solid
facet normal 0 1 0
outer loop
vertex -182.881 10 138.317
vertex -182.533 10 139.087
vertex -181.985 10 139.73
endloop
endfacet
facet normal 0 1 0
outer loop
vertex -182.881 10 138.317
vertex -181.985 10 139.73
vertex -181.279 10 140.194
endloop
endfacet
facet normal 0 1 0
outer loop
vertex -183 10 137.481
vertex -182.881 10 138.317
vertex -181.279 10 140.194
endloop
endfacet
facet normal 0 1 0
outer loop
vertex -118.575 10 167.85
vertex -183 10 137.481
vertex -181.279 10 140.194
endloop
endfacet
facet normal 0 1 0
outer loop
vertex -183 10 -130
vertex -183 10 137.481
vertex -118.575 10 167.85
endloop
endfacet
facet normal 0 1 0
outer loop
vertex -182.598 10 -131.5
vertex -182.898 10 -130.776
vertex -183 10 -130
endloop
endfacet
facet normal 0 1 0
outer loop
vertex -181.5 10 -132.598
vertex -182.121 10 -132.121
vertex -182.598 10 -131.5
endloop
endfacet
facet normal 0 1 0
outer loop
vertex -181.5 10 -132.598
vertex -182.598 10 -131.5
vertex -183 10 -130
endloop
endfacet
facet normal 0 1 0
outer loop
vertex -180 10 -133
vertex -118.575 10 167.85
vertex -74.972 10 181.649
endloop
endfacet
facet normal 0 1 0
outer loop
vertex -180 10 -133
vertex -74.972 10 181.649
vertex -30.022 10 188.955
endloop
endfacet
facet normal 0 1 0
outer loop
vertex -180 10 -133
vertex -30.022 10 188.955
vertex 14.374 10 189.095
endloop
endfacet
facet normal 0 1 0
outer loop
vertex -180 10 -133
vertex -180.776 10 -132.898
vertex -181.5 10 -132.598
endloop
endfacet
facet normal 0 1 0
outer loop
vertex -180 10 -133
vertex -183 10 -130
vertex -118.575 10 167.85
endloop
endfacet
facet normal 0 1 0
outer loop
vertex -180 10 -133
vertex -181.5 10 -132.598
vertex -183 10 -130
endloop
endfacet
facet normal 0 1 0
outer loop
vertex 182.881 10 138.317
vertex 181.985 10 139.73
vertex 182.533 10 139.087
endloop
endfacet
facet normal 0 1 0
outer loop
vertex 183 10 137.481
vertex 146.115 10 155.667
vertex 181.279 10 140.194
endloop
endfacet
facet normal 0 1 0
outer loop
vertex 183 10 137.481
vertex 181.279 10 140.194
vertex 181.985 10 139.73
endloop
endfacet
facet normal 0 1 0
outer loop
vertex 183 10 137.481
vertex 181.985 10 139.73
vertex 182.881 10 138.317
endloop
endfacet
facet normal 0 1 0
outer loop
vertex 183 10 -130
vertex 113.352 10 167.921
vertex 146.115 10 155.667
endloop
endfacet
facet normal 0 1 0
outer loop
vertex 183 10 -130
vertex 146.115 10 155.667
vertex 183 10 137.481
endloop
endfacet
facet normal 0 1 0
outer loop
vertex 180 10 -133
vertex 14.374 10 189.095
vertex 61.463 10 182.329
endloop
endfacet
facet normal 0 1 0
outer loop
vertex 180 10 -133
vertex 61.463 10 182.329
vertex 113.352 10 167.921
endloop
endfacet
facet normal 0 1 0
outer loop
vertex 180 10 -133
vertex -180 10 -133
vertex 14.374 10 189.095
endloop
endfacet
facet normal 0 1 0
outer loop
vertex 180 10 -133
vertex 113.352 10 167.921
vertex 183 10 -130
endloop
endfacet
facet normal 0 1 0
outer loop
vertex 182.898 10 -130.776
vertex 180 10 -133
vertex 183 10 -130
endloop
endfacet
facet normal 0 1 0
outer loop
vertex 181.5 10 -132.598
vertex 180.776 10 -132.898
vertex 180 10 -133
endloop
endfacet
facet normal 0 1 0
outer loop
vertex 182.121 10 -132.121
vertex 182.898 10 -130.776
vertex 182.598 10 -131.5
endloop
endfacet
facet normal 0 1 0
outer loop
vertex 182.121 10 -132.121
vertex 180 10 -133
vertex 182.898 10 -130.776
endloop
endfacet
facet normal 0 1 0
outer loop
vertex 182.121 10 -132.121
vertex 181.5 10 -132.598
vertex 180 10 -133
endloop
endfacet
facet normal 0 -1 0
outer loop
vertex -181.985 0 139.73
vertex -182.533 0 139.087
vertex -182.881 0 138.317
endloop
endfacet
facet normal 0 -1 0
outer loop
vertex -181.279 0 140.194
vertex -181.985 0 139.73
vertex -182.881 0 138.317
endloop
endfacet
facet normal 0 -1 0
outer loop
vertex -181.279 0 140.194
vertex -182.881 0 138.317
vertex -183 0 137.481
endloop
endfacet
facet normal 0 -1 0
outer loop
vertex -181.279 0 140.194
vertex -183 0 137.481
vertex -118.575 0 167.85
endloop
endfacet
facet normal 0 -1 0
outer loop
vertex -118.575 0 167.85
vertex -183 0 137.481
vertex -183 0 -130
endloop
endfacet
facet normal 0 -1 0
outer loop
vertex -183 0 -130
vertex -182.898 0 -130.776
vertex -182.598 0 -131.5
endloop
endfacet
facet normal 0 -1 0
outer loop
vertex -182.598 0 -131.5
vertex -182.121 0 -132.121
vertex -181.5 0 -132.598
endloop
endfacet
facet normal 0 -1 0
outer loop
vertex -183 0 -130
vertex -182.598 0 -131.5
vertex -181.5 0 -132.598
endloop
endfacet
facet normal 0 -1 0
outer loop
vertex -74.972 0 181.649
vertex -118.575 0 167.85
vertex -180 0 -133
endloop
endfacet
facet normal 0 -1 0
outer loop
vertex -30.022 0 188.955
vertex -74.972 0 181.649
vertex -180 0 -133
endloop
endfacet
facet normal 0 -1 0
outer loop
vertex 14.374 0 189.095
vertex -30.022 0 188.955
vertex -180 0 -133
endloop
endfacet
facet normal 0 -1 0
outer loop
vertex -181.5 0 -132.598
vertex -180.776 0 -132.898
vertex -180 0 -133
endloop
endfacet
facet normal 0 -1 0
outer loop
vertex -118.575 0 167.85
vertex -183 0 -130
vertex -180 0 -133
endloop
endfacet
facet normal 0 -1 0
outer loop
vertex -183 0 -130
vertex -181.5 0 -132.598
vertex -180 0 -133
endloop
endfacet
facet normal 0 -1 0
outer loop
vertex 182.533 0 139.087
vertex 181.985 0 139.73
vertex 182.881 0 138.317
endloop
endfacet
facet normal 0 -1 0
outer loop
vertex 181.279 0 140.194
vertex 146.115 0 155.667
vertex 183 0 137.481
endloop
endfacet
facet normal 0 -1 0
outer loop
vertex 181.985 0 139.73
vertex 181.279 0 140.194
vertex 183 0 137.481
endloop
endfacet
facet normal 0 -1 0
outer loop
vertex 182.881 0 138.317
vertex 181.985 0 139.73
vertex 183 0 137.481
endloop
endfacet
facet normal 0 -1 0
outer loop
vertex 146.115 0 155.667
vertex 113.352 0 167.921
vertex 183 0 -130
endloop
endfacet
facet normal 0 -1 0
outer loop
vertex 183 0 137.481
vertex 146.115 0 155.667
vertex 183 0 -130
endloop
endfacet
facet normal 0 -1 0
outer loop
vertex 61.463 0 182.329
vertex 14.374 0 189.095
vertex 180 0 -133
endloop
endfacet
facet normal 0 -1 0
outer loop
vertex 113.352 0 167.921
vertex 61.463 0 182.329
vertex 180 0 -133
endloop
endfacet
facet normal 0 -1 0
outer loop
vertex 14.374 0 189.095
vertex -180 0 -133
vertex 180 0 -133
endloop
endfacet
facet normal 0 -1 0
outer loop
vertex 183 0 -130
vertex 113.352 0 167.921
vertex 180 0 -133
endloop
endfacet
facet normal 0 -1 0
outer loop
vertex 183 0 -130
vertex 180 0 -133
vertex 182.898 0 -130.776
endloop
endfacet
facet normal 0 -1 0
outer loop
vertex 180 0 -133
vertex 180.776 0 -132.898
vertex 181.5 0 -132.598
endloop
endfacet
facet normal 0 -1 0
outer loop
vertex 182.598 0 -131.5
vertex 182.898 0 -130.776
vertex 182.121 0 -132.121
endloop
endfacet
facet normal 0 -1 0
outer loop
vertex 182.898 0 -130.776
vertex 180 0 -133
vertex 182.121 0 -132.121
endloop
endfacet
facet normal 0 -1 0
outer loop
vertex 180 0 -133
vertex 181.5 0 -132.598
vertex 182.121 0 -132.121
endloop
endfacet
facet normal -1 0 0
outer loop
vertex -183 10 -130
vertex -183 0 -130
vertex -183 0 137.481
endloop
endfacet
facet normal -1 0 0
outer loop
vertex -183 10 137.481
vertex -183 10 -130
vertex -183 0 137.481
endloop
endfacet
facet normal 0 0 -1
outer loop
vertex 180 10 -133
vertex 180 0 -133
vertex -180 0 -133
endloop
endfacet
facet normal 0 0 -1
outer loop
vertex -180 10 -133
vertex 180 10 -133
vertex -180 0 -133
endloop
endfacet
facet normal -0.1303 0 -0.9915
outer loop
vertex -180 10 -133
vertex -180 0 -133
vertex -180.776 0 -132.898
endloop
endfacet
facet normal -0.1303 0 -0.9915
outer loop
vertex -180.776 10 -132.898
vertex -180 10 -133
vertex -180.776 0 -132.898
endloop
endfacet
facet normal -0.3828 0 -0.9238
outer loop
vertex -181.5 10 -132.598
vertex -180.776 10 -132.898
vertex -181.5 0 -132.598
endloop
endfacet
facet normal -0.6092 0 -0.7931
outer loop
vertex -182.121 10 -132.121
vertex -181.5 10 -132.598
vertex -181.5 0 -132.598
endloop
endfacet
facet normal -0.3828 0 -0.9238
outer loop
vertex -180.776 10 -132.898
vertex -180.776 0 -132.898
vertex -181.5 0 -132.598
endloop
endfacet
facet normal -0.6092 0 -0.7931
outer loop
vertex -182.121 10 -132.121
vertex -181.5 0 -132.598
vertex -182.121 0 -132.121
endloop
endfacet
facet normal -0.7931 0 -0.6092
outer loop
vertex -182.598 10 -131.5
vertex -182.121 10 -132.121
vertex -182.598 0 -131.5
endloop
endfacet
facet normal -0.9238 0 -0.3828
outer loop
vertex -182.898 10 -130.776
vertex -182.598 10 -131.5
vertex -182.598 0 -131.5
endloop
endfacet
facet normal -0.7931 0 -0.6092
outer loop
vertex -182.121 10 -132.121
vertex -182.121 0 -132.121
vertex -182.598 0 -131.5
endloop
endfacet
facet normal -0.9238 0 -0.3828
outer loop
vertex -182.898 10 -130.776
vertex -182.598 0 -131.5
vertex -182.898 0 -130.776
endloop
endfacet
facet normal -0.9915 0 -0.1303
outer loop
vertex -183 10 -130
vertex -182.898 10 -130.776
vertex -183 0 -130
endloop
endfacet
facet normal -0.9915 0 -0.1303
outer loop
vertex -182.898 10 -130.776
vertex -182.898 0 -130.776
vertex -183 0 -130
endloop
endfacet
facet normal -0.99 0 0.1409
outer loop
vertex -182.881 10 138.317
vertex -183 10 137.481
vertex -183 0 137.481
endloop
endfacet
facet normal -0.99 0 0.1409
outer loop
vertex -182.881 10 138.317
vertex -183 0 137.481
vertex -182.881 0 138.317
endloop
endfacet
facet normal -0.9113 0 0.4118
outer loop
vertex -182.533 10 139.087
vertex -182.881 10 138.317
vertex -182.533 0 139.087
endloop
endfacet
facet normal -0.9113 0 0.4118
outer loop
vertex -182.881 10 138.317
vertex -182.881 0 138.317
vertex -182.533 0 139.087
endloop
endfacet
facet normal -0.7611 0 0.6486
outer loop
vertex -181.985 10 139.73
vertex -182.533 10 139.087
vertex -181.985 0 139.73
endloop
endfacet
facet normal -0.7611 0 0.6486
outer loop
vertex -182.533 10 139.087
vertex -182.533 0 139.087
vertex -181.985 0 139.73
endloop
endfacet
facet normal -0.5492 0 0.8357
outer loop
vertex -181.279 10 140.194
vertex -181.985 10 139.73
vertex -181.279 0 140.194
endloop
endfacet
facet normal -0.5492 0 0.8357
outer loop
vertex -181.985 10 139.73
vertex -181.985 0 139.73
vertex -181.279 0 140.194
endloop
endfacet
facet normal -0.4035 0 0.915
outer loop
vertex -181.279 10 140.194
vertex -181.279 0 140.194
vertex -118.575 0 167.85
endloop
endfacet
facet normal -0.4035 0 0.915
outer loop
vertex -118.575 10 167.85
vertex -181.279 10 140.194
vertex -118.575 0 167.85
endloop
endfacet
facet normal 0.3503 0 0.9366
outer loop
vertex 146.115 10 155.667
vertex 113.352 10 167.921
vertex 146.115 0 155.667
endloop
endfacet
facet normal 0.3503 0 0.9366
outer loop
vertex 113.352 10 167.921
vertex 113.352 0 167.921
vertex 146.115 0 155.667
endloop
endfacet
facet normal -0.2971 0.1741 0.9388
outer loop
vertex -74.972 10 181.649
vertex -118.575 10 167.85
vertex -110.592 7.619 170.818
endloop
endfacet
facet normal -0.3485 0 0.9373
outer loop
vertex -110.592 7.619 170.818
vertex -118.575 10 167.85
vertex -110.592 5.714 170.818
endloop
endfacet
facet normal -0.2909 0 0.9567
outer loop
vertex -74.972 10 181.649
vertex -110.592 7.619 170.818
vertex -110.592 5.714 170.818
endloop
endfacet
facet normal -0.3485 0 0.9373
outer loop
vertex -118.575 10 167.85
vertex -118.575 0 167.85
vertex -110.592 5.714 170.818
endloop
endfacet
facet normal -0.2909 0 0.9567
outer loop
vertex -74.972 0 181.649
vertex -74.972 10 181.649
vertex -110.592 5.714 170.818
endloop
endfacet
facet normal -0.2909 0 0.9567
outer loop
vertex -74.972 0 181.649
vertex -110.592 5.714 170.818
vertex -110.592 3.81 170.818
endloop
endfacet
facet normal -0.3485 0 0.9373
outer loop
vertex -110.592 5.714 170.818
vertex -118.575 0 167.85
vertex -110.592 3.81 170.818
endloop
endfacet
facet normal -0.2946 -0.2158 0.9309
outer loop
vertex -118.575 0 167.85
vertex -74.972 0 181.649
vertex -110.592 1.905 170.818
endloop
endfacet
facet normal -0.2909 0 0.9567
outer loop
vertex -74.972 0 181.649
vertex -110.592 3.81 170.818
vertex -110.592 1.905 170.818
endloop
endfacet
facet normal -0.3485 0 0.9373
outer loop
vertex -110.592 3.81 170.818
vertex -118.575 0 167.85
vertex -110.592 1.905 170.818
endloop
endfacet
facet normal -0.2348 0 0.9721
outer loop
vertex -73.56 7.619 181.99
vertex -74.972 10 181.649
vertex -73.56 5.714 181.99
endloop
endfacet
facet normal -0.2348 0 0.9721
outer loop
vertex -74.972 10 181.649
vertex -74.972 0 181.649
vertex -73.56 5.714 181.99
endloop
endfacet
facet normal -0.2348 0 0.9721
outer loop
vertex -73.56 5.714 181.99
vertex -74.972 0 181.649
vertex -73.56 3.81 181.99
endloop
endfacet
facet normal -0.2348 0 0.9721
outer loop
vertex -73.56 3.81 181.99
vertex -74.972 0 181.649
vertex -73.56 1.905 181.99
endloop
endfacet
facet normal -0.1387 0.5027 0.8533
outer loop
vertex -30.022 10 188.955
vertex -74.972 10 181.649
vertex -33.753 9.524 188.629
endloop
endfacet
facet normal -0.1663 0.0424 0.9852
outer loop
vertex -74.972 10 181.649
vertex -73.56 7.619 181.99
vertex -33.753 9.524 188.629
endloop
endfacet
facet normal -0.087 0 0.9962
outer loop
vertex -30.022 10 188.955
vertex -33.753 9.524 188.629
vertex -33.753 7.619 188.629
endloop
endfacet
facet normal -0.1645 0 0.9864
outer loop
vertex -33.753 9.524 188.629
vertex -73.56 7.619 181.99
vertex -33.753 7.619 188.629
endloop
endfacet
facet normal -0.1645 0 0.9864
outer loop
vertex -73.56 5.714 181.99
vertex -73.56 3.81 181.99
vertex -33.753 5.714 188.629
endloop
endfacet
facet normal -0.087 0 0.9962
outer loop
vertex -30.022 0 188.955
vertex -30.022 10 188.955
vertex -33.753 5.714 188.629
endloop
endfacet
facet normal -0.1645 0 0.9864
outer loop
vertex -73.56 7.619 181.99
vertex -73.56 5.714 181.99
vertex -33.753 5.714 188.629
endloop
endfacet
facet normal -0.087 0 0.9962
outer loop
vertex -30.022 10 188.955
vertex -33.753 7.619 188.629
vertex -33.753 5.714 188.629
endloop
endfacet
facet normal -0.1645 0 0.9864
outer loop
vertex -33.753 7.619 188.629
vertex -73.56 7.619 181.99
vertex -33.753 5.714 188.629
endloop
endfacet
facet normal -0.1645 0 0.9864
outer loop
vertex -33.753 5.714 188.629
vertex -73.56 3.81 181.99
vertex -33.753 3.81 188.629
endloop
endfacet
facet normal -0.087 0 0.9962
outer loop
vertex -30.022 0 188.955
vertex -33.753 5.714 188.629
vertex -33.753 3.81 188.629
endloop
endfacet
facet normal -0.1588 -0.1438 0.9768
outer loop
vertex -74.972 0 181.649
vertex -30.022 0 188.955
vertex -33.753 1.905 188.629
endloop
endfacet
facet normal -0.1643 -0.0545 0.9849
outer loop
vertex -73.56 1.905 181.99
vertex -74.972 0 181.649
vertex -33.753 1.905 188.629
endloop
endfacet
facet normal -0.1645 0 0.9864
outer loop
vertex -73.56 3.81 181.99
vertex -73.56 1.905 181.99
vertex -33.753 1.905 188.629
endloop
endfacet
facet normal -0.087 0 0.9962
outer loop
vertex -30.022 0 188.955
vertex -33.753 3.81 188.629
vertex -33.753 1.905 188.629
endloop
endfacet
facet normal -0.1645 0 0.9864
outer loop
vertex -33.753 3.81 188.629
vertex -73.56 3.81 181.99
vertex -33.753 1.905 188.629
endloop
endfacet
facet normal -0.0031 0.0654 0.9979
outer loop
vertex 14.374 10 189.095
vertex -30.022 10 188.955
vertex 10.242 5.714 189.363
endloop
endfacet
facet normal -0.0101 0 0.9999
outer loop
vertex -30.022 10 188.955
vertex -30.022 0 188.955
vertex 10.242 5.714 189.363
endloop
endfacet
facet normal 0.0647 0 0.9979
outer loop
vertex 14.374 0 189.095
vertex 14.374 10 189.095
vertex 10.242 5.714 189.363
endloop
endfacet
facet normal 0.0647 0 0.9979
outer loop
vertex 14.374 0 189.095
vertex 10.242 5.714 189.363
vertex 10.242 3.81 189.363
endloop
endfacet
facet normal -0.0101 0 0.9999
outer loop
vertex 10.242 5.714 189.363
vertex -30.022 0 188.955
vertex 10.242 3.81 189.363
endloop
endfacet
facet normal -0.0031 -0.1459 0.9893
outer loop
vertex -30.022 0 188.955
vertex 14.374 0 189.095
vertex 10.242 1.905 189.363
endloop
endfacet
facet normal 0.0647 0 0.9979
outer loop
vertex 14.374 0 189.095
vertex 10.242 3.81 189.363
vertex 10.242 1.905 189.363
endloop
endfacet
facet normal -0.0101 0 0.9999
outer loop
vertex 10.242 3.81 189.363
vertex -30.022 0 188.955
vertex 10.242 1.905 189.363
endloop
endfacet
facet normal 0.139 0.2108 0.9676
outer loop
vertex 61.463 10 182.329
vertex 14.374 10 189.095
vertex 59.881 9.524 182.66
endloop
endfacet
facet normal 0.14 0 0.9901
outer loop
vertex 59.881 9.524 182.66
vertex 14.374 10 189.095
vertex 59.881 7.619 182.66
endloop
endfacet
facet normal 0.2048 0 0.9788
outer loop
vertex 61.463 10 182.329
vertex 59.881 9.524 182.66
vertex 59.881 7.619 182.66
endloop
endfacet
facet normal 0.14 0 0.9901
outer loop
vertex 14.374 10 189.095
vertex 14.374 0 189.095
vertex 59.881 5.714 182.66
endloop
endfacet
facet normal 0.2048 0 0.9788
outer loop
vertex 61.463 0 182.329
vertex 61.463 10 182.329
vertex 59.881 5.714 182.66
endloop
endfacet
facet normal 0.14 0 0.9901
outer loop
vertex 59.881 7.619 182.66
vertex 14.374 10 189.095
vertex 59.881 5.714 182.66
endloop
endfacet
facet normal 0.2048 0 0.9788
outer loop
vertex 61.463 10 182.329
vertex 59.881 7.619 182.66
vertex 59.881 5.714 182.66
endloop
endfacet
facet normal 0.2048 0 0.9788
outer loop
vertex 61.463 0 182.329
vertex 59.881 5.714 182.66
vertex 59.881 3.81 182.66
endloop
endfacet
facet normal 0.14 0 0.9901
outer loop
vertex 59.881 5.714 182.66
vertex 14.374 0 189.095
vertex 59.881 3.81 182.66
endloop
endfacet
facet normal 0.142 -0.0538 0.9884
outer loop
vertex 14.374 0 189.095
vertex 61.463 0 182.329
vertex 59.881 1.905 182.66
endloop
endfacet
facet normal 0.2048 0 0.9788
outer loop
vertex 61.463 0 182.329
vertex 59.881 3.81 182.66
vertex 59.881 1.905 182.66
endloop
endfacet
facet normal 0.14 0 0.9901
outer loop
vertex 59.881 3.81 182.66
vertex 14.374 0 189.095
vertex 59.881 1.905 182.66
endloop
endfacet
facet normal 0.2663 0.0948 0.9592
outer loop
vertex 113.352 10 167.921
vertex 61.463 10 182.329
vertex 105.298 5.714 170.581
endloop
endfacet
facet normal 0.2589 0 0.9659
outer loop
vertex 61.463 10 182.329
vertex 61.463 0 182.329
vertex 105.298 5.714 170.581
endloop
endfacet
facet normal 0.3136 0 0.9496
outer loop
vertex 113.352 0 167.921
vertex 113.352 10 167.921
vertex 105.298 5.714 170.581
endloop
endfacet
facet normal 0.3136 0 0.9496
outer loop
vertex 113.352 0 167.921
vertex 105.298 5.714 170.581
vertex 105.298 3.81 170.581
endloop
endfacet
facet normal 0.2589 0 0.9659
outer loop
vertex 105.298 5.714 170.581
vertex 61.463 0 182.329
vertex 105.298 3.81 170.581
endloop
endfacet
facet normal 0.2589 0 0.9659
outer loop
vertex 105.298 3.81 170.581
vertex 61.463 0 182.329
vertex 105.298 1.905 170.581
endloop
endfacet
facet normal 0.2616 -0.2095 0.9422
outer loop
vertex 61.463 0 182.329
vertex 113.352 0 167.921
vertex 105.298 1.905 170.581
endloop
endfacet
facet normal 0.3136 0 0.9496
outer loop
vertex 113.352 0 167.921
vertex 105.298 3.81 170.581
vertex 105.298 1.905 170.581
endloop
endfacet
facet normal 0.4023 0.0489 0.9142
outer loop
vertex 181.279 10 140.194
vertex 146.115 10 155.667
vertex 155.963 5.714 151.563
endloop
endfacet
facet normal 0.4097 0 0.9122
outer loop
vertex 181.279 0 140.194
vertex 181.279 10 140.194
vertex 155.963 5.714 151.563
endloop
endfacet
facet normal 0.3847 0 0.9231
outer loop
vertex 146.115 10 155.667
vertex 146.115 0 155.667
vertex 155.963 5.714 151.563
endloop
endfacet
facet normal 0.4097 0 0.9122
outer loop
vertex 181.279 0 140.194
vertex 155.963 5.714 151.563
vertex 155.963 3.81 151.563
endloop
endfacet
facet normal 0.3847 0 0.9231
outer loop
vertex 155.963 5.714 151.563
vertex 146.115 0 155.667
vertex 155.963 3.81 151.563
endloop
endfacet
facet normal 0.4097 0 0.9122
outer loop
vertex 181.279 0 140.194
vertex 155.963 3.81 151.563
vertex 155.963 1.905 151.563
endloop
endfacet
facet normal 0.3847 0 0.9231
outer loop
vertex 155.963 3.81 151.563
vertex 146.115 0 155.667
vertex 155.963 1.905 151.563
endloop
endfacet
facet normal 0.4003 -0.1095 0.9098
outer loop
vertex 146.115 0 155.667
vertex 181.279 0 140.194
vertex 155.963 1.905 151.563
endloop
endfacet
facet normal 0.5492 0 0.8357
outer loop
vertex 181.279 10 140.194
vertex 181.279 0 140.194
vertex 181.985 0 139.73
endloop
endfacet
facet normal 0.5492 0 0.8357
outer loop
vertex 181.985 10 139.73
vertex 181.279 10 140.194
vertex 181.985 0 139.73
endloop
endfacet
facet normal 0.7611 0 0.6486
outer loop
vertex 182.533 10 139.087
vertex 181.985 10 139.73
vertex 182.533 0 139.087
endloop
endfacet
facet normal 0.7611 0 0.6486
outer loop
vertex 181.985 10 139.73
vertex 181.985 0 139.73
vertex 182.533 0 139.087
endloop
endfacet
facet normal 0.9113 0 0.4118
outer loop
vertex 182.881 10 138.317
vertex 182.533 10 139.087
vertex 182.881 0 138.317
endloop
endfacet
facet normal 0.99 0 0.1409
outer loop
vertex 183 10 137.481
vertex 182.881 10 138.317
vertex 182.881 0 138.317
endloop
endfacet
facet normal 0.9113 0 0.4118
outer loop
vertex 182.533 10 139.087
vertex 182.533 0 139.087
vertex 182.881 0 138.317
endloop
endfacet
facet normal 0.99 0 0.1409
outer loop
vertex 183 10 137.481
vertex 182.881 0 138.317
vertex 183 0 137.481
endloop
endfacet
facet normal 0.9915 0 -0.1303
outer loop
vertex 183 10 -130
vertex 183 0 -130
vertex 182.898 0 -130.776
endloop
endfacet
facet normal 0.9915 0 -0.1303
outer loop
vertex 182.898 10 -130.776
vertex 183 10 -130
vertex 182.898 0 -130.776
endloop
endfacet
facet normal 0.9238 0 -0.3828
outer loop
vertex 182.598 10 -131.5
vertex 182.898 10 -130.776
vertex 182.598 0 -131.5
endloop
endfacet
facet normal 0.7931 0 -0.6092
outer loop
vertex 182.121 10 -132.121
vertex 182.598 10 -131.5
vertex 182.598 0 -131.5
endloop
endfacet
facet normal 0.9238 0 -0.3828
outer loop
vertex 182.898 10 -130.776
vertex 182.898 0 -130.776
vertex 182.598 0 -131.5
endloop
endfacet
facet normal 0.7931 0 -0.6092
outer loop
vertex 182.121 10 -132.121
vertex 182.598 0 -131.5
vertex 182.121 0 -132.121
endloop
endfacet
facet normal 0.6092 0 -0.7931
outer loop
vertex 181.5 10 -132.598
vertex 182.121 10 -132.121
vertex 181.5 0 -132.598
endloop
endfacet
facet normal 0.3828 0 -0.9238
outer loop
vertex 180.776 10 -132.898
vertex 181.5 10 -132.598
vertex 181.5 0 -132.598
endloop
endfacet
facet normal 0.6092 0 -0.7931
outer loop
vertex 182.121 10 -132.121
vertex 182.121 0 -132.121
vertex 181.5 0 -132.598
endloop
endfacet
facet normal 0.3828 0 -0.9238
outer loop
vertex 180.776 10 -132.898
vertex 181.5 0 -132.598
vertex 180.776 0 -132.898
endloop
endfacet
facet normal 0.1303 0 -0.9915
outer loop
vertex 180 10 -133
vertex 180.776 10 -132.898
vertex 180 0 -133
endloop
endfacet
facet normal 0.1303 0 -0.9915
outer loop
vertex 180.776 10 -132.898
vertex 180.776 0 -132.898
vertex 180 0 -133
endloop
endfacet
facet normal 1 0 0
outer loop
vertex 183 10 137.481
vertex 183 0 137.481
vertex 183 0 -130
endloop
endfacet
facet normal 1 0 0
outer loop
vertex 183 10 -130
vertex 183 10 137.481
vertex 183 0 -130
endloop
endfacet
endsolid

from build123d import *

# Parameters (mm, degrees)
BOSS_EXTRUDE1_DEPTH = 10


with BuildPart() as part:
    # Sketch1 → Boss-Extrude1 (new body)
    with BuildSketch(Plane(origin=(0, 0, 0), x_dir=(1, 0, 0), z_dir=(0, 1, 0))):
        with BuildLine():
            Line((-183, 130), (-183, -137.480797285))
            ThreePointArc((-183, -137.480797285), (-182.533478711, -139.087497512), (-181.279009588, -140.194491165))
            add(Edge.make_bspline(
                [(-181.279009588, -140.194491165), (-178.340737073, -141.579348442), (-172.453888435, -144.353901137), (-160.745962638, -149.828936181), (-146.131511082, -156.50262626), (-128.508260207, -164.046283741), (-104.70271928, -173.254127298), (-74.01695968, -182.744139439), (-41.044371476, -188.463963896), (-12.576810854, -190.101586868), (10.006230222, -189.672423751), (34.003753798, -187.388029591), (59.589491457, -183.03969182), (82.369462797, -177.517534008), (101.543699637, -171.852795873), (116.417253833, -166.953916141), (131.801190076, -161.377995825), (145.060365154, -156.145247632), (155.940082719, -151.594001252), (164.236790758, -147.995411699), (171.271002297, -144.837475157), (176.961457618, -142.218806841), (179.845058415, -140.870336481), (181.279009588, -140.194491165)],
                knots=[0, 0, 0, 0, 0.03125, 0.0625, 0.125, 0.1875, 0.25, 0.375, 0.5, 0.5625, 0.625, 0.6875, 0.75, 0.8125, 0.84375, 0.875, 0.90625, 0.9375, 0.953125, 0.96875, 0.984375, 0.9921875, 1, 1, 1, 1], degree=3))
            ThreePointArc((181.279009588, -140.194491165), (182.533478711, -139.087497512), (183, -137.480797285))
            Line((183, -137.480797285), (183, 130))
            ThreePointArc((183, 130), (182.121320344, 132.121320344), (180, 133))
            Line((180, 133), (-180, 133))
            ThreePointArc((-180, 133), (-182.121320344, 132.121320344), (-183, 130))
        make_face()
    extrude(amount=BOSS_EXTRUDE1_DEPTH)


solid = part.part
